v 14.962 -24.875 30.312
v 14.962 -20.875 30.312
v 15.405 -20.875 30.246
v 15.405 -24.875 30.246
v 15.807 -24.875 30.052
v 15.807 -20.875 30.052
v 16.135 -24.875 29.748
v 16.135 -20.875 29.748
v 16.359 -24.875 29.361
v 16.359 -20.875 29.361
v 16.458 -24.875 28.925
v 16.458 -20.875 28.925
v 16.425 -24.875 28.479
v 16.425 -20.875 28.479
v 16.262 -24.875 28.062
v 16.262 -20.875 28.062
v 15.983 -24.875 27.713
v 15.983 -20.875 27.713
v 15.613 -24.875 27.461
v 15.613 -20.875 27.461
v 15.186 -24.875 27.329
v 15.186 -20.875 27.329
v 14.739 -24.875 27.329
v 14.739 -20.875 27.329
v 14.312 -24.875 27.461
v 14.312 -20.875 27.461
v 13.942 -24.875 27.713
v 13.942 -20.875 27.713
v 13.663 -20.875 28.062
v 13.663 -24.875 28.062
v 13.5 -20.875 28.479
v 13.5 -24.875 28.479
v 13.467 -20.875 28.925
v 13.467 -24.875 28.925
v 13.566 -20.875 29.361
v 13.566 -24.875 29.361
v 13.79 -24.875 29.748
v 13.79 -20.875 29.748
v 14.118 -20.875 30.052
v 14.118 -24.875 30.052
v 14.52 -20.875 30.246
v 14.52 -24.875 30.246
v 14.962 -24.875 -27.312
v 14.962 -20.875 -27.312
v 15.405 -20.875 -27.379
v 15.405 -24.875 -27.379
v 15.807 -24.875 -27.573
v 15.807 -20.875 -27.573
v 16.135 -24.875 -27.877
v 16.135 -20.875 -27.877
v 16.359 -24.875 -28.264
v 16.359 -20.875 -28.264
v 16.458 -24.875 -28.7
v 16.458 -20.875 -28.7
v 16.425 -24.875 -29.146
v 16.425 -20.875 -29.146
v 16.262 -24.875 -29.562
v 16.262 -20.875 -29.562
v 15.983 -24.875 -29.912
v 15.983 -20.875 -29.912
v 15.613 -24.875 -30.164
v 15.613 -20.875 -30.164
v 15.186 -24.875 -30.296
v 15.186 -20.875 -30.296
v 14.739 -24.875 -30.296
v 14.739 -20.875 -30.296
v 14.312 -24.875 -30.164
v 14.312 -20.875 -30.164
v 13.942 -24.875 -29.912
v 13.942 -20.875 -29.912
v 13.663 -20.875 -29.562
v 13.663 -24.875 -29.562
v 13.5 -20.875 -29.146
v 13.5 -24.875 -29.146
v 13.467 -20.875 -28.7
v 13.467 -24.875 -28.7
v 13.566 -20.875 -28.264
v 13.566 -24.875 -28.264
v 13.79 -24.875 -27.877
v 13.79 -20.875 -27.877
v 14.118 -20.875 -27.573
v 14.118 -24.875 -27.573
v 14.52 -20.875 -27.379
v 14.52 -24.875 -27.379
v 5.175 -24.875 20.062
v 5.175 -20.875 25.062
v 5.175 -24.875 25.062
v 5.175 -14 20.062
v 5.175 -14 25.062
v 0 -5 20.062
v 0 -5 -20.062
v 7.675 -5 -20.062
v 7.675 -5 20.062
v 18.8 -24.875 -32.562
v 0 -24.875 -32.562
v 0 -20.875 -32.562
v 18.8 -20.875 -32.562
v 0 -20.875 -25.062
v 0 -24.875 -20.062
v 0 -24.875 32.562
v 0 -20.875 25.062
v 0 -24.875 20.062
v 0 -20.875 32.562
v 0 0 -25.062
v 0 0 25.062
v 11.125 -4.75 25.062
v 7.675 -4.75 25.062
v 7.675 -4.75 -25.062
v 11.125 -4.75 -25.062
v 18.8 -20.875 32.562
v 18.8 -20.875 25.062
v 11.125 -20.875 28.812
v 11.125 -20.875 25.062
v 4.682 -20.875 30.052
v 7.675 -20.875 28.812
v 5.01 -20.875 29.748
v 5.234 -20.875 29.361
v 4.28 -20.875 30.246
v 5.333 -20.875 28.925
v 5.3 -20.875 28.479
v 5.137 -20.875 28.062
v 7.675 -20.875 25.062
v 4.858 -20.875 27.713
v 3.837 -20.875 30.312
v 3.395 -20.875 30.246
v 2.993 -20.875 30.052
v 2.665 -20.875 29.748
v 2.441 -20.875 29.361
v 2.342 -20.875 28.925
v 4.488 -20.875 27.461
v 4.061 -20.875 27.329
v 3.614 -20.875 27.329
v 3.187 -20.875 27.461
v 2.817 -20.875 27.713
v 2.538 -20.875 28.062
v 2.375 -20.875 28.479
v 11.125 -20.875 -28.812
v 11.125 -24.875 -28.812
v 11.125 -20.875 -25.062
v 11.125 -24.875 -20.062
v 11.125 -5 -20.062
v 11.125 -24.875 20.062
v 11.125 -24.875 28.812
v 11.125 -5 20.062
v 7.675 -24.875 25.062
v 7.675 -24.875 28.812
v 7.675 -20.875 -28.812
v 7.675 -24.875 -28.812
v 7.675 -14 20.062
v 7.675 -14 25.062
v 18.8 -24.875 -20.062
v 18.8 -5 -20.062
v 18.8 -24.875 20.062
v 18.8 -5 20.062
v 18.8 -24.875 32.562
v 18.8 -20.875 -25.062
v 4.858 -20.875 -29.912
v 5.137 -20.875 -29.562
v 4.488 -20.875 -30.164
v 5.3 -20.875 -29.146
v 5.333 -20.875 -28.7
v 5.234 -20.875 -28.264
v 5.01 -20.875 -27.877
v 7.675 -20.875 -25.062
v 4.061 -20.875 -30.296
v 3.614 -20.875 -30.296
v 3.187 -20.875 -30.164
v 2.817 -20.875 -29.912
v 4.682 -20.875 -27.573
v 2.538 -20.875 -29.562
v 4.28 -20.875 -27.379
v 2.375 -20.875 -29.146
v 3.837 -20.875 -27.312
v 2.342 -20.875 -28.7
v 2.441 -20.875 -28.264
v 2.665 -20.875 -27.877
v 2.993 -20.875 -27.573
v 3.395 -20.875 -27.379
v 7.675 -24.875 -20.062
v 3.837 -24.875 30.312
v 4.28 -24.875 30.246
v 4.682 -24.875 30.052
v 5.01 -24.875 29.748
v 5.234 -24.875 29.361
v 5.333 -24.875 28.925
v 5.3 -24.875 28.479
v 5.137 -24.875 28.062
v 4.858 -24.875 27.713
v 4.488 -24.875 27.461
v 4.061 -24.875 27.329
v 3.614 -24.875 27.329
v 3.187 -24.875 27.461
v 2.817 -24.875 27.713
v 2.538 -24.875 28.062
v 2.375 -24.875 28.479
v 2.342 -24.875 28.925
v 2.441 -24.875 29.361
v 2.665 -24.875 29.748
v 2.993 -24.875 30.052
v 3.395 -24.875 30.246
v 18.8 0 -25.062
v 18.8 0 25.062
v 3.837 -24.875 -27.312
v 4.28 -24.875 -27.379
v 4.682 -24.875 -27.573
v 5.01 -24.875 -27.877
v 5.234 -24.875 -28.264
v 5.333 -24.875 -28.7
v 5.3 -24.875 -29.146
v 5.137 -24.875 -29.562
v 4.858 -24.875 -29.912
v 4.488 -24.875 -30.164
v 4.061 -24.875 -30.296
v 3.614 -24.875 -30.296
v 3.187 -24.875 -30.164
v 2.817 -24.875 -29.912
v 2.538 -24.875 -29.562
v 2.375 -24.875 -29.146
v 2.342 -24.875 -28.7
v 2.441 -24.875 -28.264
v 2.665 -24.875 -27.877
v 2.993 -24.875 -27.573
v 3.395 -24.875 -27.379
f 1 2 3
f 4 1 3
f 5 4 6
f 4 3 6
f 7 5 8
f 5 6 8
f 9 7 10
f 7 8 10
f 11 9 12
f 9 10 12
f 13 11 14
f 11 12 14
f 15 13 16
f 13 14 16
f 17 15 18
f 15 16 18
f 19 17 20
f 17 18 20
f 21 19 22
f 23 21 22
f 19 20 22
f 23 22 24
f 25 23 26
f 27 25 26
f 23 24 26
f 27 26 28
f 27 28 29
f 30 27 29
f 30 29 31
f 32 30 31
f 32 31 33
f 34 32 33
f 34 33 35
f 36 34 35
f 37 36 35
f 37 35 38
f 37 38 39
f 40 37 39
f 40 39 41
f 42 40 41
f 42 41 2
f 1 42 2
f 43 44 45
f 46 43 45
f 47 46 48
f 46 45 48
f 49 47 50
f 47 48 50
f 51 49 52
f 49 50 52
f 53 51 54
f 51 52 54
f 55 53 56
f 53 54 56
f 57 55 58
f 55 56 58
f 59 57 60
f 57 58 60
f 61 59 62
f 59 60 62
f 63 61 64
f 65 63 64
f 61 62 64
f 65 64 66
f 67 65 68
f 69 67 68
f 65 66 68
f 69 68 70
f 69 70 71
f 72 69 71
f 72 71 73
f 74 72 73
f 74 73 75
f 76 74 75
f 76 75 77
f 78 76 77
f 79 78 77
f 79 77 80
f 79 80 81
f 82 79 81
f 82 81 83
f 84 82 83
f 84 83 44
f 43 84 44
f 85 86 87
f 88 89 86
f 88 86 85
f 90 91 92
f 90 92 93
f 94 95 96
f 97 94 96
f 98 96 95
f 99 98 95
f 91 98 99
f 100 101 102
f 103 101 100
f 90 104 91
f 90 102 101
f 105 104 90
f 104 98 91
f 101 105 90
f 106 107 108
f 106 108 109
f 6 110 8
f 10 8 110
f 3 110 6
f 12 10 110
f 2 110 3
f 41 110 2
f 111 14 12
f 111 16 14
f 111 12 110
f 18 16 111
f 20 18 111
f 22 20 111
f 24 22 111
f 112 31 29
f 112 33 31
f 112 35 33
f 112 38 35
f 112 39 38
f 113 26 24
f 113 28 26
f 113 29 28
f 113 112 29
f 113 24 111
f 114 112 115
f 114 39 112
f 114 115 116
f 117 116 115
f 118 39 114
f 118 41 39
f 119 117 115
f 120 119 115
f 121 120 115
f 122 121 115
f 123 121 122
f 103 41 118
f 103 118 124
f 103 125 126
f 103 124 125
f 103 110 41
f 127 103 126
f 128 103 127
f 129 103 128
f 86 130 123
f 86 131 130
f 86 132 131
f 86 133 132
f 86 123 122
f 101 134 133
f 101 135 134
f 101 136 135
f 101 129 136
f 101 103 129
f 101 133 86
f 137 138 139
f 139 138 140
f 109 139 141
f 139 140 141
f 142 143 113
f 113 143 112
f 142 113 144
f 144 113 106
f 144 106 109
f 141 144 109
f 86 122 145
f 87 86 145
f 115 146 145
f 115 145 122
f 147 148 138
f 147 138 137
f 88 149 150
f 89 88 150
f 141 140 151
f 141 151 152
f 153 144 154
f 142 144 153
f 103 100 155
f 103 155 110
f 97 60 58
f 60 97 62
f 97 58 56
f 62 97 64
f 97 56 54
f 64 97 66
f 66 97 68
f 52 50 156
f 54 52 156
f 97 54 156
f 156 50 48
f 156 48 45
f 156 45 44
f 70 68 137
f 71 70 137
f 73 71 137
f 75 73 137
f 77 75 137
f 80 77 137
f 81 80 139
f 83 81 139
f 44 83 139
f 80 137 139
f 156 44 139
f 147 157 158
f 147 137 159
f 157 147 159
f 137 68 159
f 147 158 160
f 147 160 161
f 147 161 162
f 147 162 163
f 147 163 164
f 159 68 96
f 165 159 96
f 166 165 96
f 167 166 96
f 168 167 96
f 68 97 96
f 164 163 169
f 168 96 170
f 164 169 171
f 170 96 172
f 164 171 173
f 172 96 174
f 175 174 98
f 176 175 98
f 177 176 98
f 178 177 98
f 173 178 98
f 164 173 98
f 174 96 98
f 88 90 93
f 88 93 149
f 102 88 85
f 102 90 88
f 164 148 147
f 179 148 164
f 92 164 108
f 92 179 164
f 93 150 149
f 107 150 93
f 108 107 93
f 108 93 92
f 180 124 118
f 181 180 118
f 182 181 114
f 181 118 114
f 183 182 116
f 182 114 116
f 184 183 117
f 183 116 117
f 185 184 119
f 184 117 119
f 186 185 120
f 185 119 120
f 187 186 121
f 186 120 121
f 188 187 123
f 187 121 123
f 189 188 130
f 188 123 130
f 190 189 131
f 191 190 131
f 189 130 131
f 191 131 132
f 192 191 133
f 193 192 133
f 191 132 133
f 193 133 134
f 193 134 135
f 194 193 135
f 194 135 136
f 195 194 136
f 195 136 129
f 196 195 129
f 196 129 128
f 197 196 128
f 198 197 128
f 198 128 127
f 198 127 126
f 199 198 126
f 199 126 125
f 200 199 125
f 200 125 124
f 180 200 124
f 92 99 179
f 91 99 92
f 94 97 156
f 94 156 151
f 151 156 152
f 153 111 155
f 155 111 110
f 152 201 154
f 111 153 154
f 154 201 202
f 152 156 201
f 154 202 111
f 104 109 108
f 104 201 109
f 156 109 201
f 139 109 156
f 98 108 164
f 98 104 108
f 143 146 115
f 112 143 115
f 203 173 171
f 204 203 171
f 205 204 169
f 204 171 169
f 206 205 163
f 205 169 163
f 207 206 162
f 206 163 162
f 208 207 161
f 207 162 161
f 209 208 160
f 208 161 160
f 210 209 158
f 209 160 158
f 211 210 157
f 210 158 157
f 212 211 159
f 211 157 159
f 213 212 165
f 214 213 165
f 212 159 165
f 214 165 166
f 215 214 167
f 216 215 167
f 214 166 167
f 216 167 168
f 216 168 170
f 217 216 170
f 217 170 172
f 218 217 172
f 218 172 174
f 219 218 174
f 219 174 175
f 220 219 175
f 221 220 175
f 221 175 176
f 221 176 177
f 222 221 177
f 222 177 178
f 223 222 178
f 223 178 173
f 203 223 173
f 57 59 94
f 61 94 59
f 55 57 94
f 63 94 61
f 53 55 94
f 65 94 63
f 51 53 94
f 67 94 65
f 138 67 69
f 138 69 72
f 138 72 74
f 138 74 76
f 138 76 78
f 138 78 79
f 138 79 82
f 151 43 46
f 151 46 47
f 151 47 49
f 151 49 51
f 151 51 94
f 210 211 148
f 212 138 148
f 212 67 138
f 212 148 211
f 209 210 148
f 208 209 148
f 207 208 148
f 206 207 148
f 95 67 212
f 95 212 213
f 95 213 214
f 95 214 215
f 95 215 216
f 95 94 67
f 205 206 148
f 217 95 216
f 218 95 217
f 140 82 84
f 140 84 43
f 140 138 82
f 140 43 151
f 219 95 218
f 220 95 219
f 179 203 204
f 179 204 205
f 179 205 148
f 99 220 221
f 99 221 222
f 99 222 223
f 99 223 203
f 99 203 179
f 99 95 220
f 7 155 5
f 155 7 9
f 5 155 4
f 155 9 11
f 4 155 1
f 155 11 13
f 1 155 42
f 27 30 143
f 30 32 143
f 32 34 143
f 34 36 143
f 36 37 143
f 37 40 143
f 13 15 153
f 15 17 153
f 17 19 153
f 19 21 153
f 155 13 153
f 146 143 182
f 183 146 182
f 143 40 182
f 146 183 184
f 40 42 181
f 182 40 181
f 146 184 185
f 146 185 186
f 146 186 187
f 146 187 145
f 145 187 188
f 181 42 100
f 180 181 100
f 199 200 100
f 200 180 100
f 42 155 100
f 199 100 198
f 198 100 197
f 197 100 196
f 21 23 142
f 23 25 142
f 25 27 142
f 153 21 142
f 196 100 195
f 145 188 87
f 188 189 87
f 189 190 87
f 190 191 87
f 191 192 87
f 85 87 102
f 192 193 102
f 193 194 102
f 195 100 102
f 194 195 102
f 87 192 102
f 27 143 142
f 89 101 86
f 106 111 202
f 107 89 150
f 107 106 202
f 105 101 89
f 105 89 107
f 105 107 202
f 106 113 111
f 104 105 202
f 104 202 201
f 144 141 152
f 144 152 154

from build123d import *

# Parameters (mm, degrees)
BOSS_EXTRUDE1_DEPTH = 18.8
SKETCH2_W           = 3.45
SKETCH2_H           = 20.125
CUT_EXTRUDE1_DEPTH  = 73.204371405
CUT_EXTRUDE2_REACH  = 45.006
SKETCH3_R           = 1.5
BOSS_EXTRUDE2_REACH = 44.46
SKETCH7_W           = 3.75
SKETCH7_H           = 4
CUT_EXTRUDE8_DEPTH  = 2.5


with BuildPart() as part:
    # Sketch1 → Boss-Extrude1 (new body)
    with BuildSketch(Plane(origin=(0, 0, 0), x_dir=(0, 0, -1), z_dir=(1, 0, 0))):
        Polygon((-25.0625, 0), (25.0625, 0), (25.0625, -20.875), (32.5625, -20.875), (32.5625, -24.875), (25.0625, -24.875), (20.0625, -24.875), (20.0625, -5), (-20.0625, -5), (-20.0625, -24.875), (-25.0625, -24.875), (-32.5625, -24.875), (-32.5625, -20.875), (-25.0625, -20.875), align=None)
    extrude(amount=BOSS_EXTRUDE1_DEPTH)

    # Sketch2 → Cut-Extrude1 (cut, through all)
    with BuildSketch(Plane.XY.offset(32.5625)):
        with Locations((9.4, -14.8125)):
            Rectangle(SKETCH2_W, SKETCH2_H)
    extrude(amount=-CUT_EXTRUDE1_DEPTH, mode=Mode.SUBTRACT)

    # Sketch3 → Cut-Extrude2 (cut, up to next)
    with BuildSketch(Plane(origin=(0, -20.875, 0), x_dir=(1, 0, 0), z_dir=(0, 1, 0)), mode=Mode.PRIVATE) as cut_extrude2_sk1:
        with Locations(Location((3.8375, -28.8125, 0), (0, 0, 270))):
            Circle(SKETCH3_R)
    cut_extrude2_tool1 = extrude(cut_extrude2_sk1.sketch, amount=-CUT_EXTRUDE2_REACH, mode=Mode.PRIVATE) & part.part
    # Sketch3 → Cut-Extrude2 (cut, up to next)
    with BuildSketch(Plane(origin=(0, -20.875, 0), x_dir=(1, 0, 0), z_dir=(0, 1, 0)), mode=Mode.PRIVATE) as cut_extrude2_sk2:
        with Locations(Location((14.9625, -28.8125, 0), (0, 0, 270))):
            Circle(SKETCH3_R)
    cut_extrude2_tool2 = extrude(cut_extrude2_sk2.sketch, amount=-CUT_EXTRUDE2_REACH, mode=Mode.PRIVATE) & part.part
    # Sketch3 → Cut-Extrude2 (cut, up to next)
    with BuildSketch(Plane(origin=(0, -20.875, 0), x_dir=(1, 0, 0), z_dir=(0, 1, 0)), mode=Mode.PRIVATE) as cut_extrude2_sk3:
        with Locations(Location((14.9625, 28.8125, 0), (0, 0, 270))):
            Circle(SKETCH3_R)
    cut_extrude2_tool3 = extrude(cut_extrude2_sk3.sketch, amount=-CUT_EXTRUDE2_REACH, mode=Mode.PRIVATE) & part.part
    # Sketch3 → Cut-Extrude2 (cut, up to next)
    with BuildSketch(Plane(origin=(0, -20.875, 0), x_dir=(1, 0, 0), z_dir=(0, 1, 0)), mode=Mode.PRIVATE) as cut_extrude2_sk4:
        with Locations(Location((3.8375, 28.8125, 0), (0, 0, 270))):
            Circle(SKETCH3_R)
    cut_extrude2_tool4 = extrude(cut_extrude2_sk4.sketch, amount=-CUT_EXTRUDE2_REACH, mode=Mode.PRIVATE) & part.part
    add(cut_extrude2_tool1.solids().sort_by_distance((3.8375, -20.875, 28.8125))[0], mode=Mode.SUBTRACT)
    add(cut_extrude2_tool2.solids().sort_by_distance((14.9625, -20.875, 28.8125))[0], mode=Mode.SUBTRACT)
    add(cut_extrude2_tool3.solids().sort_by_distance((14.9625, -20.875, -28.8125))[0], mode=Mode.SUBTRACT)
    add(cut_extrude2_tool4.solids().sort_by_distance((3.8375, -20.875, -28.8125))[0], mode=Mode.SUBTRACT)

    # Sketch7 → Boss-Extrude2 (add, up to next)
    with BuildSketch(Plane(origin=(7.675, 0, 0), x_dir=(0, 0, -1), z_dir=(1, 0, 0)), mode=Mode.PRIVATE) as boss_extrude2_sk1:
        with Locations((-30.6875, -22.875)):
            Rectangle(SKETCH7_W, SKETCH7_H)
    boss_extrude2_tool1 = extrude(boss_extrude2_sk1.sketch, amount=BOSS_EXTRUDE2_REACH, mode=Mode.PRIVATE) - part.part
    boss_extrude2 = boss_extrude2_tool1.solids().sort_by_distance((7.675, -22.875, 30.6875))[0]
    add(boss_extrude2)

    # Mirror1: Boss-Extrude2 across plane
    add(boss_extrude2.mirror(Plane.XY))

    # Sketch4 → Cut-Extrude8 (cut)
    with BuildSketch(Plane(origin=(7.675, 0, 0), x_dir=(0, 0, -1), z_dir=(1, 0, 0))):
        Polygon((-20.0625, -24.875), (-20.0625, -15.75), (-20.0625, -14), (-25.0625, -14), (-25.0625, -15.75), (-25.0625, -24.875), align=None)
    extrude(amount=-CUT_EXTRUDE8_DEPTH, mode=Mode.SUBTRACT)


solid = part.part
